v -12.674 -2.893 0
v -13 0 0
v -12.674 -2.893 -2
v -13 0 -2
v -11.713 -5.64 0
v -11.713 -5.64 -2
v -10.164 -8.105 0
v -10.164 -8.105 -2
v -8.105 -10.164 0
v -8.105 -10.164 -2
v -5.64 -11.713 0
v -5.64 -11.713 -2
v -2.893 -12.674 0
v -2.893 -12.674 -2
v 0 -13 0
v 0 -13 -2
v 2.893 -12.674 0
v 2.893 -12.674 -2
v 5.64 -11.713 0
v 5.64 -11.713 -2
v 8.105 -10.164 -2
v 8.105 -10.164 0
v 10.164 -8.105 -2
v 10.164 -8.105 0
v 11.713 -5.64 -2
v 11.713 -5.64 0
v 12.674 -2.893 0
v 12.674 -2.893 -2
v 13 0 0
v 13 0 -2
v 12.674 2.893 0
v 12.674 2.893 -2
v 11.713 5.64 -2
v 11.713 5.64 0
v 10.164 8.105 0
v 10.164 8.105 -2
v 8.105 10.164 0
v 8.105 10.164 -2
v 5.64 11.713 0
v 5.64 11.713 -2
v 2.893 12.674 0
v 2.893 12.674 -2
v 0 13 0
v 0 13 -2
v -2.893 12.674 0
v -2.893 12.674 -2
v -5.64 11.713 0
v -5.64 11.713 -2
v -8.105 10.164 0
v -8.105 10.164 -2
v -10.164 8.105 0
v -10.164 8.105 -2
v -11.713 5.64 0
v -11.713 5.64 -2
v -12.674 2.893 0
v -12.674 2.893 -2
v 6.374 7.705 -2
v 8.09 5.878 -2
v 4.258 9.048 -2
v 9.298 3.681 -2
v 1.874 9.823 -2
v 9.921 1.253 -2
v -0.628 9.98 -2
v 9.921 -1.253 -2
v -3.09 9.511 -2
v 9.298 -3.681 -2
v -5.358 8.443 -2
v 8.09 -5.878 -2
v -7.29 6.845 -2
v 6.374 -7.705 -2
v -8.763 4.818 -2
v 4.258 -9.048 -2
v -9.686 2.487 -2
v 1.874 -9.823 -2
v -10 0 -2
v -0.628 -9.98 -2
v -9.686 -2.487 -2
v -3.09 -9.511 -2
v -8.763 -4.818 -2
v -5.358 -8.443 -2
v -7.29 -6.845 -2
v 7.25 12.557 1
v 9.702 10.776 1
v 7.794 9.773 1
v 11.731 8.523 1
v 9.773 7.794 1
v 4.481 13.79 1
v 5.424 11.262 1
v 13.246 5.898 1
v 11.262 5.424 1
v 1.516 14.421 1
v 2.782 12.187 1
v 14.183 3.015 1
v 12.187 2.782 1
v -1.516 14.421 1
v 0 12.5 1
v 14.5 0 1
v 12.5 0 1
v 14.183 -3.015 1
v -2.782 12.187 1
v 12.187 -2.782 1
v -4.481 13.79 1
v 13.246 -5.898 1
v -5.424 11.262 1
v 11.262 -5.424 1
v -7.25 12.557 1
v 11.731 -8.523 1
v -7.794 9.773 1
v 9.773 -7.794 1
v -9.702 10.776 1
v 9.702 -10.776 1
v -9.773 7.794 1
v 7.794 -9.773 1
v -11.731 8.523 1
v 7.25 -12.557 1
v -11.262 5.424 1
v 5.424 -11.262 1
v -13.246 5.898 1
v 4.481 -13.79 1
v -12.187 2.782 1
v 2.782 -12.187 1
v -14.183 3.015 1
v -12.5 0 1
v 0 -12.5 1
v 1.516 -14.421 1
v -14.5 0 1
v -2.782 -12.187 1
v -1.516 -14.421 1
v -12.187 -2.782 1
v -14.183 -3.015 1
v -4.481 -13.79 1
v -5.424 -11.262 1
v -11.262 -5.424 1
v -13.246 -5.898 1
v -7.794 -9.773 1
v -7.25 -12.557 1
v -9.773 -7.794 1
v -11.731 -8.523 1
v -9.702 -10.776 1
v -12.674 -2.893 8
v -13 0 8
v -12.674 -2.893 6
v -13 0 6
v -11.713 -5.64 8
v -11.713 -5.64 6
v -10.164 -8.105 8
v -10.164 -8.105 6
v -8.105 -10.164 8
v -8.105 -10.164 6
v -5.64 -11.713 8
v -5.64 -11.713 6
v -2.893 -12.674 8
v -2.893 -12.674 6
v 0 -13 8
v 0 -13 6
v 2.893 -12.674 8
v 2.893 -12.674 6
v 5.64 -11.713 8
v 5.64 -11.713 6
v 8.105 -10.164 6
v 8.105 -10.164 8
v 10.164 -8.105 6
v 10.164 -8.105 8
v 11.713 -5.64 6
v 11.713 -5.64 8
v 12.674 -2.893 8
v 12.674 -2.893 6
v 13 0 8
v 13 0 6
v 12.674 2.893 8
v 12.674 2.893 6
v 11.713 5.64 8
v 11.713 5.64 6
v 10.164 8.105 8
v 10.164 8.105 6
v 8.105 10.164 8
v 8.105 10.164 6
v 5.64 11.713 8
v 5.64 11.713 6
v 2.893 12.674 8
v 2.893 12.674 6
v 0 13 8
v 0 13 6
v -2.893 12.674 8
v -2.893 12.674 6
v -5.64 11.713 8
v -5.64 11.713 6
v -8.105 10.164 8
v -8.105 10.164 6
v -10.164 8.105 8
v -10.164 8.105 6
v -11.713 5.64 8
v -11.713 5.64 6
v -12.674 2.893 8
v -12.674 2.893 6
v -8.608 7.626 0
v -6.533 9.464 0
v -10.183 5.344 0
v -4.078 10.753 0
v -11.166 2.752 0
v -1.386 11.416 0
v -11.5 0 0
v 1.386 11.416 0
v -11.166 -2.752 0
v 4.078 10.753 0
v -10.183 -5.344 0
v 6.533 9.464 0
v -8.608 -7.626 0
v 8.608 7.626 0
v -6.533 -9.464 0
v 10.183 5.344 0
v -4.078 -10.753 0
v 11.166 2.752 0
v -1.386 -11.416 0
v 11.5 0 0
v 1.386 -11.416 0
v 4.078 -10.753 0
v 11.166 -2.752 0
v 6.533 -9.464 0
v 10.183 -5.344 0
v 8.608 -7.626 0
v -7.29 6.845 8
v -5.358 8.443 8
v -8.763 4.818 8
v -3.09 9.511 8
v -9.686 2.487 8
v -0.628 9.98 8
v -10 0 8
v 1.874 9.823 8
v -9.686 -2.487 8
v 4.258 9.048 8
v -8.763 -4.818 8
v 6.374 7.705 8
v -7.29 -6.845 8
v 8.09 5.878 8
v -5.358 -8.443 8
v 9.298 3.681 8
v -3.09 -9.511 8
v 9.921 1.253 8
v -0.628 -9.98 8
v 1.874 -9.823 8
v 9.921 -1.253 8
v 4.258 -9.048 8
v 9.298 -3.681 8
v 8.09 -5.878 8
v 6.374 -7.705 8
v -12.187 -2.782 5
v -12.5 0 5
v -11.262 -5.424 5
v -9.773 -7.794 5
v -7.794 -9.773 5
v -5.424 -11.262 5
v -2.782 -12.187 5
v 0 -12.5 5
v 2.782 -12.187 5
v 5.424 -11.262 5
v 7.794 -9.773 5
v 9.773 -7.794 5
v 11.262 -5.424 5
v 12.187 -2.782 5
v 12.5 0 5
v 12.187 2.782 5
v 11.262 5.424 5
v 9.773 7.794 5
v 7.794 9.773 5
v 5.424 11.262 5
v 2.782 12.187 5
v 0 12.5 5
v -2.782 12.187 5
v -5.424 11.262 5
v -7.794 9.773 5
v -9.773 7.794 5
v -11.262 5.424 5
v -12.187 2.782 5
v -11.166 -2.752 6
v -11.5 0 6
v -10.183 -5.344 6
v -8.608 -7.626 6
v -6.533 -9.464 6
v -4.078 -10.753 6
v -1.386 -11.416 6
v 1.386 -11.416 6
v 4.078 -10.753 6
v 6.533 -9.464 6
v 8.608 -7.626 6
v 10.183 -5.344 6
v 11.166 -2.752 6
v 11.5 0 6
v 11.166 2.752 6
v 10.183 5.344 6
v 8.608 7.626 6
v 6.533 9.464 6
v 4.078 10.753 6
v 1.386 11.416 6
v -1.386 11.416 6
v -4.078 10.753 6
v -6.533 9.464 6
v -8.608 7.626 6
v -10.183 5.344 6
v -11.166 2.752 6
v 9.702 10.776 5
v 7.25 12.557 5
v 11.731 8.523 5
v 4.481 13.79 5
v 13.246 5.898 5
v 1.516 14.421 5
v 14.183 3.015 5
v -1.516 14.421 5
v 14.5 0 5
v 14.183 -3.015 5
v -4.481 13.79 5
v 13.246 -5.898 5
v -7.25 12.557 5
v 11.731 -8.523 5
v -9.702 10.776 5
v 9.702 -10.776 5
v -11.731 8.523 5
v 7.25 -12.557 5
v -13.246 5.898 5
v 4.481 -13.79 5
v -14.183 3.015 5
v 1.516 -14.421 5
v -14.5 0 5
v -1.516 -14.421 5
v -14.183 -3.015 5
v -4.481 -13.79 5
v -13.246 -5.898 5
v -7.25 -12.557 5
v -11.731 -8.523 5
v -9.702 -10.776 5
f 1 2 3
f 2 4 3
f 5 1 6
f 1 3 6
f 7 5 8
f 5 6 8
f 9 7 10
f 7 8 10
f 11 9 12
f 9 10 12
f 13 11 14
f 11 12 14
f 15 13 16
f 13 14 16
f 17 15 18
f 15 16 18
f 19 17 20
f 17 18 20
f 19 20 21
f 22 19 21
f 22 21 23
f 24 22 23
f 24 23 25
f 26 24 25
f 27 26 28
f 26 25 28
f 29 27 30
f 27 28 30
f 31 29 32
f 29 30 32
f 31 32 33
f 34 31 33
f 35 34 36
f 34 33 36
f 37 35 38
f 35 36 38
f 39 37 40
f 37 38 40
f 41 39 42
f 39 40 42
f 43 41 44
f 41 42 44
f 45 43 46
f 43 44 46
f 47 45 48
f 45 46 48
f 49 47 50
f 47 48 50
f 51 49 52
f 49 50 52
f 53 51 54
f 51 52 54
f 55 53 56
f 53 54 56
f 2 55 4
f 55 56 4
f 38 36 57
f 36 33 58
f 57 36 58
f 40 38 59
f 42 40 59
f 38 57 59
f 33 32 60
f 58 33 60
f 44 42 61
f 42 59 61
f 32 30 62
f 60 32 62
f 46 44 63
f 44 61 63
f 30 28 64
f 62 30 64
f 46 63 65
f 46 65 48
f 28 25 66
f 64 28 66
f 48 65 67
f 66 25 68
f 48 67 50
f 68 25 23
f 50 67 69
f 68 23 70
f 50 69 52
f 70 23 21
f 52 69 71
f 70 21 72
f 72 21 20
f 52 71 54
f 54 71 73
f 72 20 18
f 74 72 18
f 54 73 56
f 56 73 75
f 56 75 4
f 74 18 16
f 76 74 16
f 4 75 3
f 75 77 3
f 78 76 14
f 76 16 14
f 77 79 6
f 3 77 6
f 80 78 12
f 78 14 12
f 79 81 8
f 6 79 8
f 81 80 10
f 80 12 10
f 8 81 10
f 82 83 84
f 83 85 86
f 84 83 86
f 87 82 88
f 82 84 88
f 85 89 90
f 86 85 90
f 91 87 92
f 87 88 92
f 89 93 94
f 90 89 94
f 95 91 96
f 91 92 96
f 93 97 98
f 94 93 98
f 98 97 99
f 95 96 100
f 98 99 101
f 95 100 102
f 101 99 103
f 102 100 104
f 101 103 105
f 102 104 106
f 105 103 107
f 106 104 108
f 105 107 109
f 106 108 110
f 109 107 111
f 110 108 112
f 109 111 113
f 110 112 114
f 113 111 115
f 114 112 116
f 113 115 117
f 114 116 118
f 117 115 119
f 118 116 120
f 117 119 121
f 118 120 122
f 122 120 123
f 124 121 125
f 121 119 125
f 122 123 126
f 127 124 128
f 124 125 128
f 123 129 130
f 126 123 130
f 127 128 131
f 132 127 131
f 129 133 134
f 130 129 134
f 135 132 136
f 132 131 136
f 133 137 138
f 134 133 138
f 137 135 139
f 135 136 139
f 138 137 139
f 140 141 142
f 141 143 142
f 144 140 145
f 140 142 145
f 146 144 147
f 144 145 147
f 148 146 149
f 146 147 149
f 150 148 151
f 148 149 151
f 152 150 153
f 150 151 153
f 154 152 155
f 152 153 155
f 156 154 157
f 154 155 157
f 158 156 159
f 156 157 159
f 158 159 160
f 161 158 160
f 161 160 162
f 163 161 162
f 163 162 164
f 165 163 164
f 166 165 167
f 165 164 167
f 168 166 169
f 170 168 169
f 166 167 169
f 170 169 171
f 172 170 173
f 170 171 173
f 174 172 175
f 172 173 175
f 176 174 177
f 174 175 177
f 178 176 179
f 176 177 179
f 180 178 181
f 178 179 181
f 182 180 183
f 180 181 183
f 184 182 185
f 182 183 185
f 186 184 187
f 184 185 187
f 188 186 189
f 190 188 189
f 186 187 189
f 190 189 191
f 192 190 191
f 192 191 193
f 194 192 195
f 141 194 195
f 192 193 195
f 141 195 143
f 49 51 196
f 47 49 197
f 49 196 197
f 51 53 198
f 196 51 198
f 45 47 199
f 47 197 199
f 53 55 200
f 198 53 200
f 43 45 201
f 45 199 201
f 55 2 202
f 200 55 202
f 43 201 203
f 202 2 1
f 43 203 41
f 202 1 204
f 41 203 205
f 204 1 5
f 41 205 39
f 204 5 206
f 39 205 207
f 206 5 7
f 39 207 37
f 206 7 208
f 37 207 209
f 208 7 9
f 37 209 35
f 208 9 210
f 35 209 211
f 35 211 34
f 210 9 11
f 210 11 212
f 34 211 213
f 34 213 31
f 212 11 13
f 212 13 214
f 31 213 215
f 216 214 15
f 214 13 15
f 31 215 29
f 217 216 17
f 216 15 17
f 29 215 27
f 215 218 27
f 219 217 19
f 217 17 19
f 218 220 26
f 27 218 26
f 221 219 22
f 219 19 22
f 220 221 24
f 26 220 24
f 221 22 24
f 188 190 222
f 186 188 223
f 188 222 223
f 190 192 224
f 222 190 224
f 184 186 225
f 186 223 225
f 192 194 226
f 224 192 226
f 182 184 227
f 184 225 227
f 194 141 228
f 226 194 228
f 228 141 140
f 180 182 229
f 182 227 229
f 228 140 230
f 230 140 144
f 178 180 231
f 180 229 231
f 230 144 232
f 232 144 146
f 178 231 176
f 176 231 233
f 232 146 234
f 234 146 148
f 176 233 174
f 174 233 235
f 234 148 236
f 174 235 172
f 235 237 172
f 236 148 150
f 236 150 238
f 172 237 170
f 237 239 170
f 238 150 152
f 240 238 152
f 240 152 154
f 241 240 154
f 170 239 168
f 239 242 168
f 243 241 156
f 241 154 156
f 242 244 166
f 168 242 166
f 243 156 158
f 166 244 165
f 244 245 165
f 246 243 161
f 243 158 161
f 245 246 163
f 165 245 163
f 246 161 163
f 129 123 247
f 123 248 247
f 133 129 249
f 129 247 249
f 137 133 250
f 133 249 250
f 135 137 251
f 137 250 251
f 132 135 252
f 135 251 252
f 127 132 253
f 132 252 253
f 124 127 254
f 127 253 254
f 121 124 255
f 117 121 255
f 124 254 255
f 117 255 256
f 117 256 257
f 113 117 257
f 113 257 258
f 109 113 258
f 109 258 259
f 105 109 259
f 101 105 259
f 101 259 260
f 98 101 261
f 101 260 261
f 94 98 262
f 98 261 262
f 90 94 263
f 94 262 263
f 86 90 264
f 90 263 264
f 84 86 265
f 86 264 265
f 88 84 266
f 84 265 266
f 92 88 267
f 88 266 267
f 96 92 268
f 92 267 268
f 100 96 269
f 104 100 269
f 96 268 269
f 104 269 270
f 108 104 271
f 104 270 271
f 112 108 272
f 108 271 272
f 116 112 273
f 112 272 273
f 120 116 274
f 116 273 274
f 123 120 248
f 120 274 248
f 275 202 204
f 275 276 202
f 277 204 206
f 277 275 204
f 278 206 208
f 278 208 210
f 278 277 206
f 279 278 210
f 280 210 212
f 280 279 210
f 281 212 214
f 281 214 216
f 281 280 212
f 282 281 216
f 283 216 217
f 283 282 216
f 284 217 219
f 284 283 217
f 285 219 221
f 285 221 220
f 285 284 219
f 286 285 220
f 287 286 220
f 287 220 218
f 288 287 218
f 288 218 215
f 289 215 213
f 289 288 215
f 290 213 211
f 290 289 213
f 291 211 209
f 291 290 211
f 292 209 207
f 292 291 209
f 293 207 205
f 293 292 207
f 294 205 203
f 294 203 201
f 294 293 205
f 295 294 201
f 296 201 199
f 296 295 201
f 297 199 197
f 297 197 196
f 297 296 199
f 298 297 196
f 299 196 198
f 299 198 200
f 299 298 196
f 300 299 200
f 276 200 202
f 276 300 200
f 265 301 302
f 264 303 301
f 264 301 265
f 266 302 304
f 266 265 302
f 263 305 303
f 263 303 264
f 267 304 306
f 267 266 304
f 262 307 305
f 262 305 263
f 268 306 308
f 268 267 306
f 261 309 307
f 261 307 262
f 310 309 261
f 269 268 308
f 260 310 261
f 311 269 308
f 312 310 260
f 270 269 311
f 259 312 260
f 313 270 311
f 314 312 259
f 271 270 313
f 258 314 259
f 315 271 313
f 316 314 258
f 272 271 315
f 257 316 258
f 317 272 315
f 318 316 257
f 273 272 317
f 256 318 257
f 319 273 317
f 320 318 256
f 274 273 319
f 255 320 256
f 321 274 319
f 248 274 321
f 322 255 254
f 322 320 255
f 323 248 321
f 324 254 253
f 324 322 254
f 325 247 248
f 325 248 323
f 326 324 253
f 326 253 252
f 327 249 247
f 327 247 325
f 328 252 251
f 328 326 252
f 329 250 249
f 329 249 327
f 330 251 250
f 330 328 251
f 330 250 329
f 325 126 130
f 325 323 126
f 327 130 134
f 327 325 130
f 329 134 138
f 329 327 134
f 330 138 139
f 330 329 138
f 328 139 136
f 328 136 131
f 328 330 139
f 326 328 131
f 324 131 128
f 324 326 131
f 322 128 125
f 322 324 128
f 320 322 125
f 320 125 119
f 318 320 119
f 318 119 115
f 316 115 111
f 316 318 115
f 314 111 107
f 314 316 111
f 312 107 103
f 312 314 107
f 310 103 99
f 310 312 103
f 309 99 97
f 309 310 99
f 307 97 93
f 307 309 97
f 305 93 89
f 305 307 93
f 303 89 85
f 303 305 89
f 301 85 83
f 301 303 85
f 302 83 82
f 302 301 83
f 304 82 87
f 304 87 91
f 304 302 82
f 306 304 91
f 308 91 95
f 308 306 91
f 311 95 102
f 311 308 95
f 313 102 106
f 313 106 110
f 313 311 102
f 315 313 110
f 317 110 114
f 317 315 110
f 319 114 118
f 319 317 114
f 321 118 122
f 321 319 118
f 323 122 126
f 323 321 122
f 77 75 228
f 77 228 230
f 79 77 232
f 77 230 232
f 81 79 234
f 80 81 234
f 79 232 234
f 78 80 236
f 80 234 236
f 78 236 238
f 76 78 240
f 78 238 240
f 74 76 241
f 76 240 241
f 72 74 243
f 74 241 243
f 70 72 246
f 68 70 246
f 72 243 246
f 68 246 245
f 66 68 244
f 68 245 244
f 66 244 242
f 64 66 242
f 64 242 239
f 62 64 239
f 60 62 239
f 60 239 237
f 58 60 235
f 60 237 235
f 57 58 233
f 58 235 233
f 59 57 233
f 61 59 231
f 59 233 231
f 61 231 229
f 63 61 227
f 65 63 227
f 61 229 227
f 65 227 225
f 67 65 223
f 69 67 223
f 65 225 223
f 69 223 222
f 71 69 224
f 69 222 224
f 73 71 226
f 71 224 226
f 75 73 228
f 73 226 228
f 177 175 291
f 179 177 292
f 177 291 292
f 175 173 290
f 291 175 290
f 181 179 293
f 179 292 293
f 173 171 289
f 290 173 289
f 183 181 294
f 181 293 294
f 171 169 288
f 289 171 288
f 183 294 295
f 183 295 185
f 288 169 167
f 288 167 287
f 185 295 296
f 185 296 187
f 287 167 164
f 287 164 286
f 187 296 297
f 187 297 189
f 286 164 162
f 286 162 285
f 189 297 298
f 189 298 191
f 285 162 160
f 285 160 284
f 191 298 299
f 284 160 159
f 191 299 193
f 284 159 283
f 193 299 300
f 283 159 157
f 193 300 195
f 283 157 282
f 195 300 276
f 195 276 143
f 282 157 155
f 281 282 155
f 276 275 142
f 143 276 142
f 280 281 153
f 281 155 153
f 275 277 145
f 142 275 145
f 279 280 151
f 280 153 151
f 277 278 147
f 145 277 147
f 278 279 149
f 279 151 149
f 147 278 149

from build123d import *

# Parameters (mm, degrees)
F0_W   = 1.5
F0_H   = 6
F0_W_2 = 2
F0_H_2 = 4


with BuildPart() as f1:
    # F0 (on Front) → F1 (revolve)
    with BuildSketch(Plane.XZ):
        Polygon((-11.5, 6), (-10, 6), (-10, 8), (-13, 8), (-13, 6), align=None)
        with Locations((-10.75, 3)):
            Rectangle(F0_W, F0_H)
        Polygon((-10, -2), (-10, 0), (-11.5, 0), (-13, 0), (-13, -2), align=None)
        with Locations((-13.5, 3)):
            Rectangle(F0_W_2, F0_H_2)
    revolve(axis=Axis((0, 0, 3.658223), (0, 0, 1)))


solid = f1.part
